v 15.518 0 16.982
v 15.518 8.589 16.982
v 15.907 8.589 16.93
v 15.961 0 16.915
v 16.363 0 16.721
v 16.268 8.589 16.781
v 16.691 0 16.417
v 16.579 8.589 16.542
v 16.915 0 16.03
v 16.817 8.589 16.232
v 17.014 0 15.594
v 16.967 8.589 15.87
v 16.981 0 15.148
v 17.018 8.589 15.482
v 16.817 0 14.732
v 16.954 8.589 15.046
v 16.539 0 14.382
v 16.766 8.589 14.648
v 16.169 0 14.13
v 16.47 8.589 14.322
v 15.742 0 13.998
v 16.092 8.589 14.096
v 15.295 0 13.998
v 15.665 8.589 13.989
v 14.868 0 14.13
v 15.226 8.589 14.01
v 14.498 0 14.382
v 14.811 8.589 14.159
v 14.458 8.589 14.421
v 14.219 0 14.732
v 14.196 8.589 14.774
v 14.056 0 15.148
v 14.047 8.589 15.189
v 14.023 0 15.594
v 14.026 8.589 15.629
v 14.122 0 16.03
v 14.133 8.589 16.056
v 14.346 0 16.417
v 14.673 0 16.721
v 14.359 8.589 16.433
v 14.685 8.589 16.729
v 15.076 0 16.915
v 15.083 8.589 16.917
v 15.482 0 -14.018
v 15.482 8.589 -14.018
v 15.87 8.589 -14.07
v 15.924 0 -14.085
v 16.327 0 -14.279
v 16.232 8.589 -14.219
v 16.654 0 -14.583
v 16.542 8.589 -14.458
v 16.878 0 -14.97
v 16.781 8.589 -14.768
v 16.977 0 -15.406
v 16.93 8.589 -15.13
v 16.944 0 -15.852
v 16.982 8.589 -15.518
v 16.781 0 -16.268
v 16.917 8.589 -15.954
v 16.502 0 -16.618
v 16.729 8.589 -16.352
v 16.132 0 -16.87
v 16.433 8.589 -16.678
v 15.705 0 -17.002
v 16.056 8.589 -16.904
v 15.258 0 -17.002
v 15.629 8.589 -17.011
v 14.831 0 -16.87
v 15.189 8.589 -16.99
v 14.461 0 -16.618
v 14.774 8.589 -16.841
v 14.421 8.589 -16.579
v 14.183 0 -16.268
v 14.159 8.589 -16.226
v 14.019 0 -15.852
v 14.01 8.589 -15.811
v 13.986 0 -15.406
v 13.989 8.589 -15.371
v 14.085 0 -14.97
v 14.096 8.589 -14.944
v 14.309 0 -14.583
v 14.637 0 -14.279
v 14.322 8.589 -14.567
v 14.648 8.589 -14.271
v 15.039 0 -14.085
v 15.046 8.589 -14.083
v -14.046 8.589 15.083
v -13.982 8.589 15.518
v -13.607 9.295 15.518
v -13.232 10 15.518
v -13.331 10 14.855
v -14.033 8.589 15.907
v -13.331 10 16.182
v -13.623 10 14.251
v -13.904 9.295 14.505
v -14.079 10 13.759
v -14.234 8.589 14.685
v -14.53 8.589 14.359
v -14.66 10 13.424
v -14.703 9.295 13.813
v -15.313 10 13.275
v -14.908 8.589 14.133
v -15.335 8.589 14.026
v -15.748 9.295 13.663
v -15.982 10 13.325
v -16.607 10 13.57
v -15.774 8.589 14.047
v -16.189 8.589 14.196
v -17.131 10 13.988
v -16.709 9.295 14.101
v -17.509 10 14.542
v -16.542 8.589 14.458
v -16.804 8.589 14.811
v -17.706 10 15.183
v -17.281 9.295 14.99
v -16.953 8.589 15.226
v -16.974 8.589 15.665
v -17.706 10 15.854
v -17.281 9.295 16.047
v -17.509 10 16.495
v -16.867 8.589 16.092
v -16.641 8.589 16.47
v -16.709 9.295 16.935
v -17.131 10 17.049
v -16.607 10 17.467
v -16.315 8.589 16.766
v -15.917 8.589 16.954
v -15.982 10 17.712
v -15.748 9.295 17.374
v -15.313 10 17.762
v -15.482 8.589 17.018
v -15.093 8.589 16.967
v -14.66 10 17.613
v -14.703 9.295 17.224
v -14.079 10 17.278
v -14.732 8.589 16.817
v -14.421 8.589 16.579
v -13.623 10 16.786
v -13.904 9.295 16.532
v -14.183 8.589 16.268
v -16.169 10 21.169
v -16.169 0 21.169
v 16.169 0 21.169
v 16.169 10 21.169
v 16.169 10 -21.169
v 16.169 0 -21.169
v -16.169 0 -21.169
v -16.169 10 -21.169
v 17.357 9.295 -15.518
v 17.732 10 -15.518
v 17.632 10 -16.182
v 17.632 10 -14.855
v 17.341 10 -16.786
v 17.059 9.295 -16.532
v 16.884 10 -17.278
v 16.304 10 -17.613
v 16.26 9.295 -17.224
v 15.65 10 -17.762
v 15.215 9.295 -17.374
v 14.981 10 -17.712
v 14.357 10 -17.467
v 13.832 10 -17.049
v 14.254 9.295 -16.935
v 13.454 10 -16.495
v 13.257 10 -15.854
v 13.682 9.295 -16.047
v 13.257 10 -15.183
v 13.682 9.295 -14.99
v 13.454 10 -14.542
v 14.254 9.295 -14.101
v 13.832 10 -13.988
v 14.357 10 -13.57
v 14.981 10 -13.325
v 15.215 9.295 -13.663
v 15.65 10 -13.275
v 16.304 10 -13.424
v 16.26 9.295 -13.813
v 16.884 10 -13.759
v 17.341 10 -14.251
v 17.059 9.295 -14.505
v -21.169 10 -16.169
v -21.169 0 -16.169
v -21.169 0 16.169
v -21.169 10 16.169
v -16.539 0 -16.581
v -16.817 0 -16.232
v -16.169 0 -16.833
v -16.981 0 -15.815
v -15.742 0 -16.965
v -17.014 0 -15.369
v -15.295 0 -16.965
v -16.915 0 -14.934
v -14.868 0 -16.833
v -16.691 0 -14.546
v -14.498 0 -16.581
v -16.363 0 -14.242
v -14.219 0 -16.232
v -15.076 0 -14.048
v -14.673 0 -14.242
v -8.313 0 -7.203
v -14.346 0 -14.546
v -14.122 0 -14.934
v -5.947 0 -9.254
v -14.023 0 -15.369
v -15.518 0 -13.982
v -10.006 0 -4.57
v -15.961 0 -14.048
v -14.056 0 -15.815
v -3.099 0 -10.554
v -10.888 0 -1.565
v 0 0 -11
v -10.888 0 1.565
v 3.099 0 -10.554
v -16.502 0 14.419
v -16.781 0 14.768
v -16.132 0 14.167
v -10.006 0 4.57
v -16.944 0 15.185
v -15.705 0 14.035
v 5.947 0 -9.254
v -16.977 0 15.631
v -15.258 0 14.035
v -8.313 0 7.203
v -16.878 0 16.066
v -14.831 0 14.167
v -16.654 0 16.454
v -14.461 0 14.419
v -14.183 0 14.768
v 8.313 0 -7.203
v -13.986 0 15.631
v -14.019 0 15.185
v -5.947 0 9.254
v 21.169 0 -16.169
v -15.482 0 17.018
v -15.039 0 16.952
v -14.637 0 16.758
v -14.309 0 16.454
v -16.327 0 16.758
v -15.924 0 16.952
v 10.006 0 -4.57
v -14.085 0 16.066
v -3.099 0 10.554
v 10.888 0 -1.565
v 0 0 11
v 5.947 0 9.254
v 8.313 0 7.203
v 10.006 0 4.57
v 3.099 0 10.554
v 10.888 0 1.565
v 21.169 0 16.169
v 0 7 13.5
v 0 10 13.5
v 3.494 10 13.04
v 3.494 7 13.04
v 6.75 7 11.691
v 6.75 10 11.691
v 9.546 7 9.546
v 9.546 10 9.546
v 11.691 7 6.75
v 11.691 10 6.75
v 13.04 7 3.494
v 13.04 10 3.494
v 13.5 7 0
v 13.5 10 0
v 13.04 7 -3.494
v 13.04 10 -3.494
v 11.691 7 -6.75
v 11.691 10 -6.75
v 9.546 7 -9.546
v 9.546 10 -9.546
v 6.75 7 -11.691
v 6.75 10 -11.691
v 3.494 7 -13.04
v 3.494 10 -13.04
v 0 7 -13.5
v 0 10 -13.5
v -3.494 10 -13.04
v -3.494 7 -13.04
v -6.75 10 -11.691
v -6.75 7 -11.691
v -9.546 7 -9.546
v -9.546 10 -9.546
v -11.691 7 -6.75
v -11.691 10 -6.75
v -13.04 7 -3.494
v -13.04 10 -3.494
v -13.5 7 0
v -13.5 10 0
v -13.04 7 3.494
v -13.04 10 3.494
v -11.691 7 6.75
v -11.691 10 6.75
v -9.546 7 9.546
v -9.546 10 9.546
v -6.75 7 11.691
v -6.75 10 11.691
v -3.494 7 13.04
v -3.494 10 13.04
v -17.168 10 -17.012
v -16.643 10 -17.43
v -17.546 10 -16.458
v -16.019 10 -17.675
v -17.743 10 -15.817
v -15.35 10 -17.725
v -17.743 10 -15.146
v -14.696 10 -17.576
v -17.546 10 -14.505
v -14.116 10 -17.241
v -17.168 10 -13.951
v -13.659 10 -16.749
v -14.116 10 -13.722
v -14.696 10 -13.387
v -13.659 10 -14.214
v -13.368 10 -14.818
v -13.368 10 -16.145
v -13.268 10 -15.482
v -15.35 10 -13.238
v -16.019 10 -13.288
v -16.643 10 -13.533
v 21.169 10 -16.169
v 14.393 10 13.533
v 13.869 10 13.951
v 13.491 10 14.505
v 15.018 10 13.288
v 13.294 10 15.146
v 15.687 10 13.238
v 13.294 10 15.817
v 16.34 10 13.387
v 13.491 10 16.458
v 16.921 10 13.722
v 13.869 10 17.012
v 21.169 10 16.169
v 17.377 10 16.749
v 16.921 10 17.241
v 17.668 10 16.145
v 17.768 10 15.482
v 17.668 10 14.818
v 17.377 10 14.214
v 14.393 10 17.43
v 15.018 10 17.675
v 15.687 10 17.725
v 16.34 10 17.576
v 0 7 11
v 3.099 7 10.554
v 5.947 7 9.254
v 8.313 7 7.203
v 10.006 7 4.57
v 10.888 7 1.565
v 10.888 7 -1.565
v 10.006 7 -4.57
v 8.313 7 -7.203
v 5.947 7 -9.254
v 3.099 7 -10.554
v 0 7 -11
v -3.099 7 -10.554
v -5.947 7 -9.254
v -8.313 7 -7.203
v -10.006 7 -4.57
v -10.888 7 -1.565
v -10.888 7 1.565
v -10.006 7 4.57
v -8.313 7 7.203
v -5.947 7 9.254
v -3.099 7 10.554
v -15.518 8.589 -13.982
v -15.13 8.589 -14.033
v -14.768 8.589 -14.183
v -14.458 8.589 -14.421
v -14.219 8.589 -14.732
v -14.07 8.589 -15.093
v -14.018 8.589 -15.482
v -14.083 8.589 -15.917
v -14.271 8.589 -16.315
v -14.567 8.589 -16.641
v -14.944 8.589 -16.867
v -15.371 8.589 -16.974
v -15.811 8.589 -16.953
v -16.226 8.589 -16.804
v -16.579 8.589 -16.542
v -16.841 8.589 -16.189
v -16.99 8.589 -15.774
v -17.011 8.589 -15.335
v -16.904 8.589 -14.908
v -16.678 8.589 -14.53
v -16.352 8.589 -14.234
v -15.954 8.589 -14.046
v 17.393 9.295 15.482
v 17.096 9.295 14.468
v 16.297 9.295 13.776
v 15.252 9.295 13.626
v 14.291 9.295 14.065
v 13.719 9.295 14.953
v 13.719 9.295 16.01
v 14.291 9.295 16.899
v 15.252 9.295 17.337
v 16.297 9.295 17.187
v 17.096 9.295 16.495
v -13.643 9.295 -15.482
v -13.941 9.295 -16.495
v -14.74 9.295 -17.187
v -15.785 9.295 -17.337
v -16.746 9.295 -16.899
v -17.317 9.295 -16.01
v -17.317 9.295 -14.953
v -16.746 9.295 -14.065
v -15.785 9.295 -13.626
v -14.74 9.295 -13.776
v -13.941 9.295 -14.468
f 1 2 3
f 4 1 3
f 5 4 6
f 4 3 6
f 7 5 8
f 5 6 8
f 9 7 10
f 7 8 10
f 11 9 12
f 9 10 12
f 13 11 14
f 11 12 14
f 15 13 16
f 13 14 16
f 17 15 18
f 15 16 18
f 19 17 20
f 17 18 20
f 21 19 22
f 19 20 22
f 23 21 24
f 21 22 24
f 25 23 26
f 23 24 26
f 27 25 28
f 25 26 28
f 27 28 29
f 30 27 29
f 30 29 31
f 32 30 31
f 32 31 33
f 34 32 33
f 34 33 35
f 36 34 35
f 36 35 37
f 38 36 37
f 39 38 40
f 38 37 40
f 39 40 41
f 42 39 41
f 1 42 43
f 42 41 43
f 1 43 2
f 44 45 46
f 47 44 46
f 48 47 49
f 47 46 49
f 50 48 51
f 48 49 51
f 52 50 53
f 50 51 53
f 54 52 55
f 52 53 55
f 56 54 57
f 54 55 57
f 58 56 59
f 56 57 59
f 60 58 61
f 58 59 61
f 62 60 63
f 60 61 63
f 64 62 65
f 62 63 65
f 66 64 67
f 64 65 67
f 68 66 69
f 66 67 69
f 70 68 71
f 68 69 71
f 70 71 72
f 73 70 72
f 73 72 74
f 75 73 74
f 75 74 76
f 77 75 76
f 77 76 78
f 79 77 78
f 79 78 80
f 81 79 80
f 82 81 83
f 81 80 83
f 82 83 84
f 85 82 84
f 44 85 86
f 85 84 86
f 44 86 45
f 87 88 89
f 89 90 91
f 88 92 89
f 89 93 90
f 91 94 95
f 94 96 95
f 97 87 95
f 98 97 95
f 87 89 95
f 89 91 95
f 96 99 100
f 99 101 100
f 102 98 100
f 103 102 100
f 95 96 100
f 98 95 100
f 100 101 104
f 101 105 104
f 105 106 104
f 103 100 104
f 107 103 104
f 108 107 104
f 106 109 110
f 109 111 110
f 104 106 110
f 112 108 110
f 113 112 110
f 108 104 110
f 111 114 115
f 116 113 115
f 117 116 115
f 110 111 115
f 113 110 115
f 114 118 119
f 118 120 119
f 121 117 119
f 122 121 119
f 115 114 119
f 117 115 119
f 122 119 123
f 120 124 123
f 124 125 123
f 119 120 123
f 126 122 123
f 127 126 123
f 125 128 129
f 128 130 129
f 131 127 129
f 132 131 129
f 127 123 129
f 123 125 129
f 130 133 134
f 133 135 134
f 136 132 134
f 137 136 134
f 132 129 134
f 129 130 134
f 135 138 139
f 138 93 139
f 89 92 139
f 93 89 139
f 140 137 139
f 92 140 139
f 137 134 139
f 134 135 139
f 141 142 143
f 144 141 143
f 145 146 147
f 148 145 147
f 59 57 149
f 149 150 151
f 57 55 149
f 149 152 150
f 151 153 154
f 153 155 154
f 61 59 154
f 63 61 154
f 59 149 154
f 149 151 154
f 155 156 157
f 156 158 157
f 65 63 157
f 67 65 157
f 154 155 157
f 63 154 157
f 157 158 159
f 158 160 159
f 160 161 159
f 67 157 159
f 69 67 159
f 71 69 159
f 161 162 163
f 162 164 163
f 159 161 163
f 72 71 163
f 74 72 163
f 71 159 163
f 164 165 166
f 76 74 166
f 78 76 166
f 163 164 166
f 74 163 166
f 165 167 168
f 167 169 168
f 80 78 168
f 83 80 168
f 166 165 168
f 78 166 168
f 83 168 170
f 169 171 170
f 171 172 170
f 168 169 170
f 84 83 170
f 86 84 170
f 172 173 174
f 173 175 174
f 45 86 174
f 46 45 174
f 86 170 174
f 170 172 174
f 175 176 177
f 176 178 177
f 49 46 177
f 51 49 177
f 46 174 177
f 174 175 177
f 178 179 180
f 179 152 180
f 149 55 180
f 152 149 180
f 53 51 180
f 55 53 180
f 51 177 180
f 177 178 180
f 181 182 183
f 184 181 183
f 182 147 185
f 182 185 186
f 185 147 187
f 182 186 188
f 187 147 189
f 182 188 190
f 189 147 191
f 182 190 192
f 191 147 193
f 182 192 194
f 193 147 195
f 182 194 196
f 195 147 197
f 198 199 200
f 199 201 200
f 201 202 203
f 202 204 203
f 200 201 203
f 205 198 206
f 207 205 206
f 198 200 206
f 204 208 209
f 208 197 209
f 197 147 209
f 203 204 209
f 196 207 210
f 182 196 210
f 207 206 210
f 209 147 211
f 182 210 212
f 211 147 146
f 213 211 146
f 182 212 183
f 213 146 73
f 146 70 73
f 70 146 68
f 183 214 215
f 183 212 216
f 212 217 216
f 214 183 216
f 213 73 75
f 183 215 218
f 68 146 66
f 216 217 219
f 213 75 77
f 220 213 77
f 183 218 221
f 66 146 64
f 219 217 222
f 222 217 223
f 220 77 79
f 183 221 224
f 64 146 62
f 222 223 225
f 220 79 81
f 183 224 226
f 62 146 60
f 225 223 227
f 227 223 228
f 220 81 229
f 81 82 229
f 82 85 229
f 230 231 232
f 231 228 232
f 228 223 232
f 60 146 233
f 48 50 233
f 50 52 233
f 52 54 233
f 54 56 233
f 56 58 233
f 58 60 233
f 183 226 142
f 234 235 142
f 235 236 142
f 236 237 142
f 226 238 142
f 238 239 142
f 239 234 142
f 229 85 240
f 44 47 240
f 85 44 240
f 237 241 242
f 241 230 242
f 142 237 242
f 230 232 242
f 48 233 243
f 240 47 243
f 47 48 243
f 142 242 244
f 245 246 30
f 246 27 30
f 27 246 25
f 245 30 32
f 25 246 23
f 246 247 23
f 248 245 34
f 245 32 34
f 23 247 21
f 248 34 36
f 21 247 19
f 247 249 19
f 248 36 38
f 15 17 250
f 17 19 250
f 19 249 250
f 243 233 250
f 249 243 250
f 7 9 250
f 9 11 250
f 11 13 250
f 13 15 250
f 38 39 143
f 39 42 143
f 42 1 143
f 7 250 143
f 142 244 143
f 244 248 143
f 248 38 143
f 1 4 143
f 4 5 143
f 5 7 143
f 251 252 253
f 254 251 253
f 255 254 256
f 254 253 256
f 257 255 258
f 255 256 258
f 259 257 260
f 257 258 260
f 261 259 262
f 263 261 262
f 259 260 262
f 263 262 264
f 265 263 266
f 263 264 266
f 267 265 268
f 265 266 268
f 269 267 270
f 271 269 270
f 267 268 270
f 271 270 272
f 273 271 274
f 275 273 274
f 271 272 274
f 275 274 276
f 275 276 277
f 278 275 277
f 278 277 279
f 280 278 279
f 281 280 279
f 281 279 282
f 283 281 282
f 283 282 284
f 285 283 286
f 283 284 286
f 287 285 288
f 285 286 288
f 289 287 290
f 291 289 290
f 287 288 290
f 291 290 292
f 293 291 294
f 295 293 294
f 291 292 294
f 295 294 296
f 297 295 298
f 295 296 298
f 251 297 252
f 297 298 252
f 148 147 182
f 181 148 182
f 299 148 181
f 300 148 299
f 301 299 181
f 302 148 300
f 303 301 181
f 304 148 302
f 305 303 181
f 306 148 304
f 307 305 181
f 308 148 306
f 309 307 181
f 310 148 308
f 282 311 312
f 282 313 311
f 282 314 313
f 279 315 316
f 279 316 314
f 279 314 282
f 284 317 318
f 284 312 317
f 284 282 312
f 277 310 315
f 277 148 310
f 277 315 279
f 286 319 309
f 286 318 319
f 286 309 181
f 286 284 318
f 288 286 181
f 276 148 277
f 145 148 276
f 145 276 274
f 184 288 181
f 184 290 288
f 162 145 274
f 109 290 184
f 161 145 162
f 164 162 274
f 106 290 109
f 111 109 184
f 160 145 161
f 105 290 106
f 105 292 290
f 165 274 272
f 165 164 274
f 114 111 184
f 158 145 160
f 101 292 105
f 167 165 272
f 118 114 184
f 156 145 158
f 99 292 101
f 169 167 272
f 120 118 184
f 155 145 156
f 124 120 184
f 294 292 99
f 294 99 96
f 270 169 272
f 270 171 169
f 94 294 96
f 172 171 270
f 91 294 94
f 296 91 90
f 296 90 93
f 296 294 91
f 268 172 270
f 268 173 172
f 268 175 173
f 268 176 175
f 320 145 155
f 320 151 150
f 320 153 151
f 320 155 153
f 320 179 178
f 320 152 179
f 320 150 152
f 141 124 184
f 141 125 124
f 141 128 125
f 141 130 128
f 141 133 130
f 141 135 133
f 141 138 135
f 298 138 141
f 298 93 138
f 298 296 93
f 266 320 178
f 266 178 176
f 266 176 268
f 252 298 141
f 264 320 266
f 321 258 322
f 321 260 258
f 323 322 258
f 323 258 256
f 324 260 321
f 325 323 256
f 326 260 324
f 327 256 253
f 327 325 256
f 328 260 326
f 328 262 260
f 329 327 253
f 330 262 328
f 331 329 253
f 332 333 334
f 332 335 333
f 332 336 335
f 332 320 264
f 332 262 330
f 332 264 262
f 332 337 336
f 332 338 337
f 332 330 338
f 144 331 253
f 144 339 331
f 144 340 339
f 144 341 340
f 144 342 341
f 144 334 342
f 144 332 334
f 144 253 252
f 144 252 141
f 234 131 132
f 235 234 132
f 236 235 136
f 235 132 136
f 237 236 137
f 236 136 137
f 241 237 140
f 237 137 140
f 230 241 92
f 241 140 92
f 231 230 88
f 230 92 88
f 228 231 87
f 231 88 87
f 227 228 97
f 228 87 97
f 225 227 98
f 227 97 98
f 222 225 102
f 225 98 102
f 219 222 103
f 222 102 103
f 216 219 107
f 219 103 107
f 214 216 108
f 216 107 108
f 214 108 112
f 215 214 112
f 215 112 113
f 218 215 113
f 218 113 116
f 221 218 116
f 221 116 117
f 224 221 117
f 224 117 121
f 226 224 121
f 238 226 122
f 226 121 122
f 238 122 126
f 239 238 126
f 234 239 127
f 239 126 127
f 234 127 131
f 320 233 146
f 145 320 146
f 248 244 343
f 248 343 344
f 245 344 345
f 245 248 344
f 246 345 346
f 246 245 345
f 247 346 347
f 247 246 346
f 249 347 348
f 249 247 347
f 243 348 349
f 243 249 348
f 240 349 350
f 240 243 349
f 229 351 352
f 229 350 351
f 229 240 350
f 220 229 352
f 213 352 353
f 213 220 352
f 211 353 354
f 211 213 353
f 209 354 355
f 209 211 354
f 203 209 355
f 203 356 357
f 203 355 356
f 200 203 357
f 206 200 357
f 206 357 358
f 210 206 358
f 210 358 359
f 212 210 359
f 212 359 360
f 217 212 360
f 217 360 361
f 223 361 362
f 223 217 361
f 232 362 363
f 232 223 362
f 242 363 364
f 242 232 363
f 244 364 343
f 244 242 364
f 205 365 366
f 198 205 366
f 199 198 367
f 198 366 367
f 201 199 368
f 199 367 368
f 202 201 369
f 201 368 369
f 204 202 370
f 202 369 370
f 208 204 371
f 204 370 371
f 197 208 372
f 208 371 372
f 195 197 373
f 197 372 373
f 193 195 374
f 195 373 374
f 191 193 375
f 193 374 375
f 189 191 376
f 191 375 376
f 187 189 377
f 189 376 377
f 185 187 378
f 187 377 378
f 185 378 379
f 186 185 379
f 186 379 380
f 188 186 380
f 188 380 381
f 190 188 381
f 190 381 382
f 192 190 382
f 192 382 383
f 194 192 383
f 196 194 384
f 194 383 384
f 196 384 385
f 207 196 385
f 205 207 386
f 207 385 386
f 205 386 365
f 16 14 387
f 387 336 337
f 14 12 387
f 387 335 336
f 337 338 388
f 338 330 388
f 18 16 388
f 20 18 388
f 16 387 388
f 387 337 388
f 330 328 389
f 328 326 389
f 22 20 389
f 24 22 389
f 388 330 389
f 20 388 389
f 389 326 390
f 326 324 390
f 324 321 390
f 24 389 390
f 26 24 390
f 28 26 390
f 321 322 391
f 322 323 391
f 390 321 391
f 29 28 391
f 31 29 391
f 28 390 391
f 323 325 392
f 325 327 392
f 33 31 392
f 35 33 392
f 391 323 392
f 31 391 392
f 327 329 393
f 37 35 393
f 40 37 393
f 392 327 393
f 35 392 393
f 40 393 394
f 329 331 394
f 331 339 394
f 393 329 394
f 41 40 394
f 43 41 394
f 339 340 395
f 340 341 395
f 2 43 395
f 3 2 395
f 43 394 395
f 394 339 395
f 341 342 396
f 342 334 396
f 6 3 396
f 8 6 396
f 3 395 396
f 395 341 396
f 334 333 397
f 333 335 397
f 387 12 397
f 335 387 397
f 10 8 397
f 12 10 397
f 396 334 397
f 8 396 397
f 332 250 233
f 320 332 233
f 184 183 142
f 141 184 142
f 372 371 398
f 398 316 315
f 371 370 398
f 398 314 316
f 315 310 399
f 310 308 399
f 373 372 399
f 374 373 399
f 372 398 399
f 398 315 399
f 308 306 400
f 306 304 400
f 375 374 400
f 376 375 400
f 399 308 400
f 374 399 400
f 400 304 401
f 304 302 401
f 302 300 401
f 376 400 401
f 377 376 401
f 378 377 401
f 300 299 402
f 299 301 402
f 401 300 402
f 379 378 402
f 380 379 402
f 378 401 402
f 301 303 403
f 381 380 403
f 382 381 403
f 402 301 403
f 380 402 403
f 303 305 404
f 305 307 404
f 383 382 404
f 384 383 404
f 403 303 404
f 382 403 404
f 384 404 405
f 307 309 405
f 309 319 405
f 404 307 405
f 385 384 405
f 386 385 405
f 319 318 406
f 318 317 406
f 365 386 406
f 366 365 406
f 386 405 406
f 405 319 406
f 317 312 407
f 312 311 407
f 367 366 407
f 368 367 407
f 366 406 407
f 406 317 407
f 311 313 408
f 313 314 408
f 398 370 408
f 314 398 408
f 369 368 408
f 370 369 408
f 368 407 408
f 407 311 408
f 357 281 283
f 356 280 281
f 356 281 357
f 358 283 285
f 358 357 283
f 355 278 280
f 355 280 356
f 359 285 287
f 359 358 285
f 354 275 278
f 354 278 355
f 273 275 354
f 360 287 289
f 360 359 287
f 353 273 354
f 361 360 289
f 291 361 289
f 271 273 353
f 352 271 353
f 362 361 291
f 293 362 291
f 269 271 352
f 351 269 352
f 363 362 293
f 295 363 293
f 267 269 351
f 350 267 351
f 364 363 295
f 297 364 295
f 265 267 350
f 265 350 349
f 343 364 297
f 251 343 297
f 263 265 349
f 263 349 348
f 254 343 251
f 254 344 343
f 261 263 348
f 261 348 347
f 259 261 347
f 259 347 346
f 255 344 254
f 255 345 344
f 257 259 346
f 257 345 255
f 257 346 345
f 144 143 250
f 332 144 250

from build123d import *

# Parameters (mm, degrees)
SKETCH1_R                    = 33.334829616
SKETCH1_R_2                  = 11
EXTRUDE1_DEPTH               = 10
SKETCH2_W                    = 68.7469374
SKETCH2_H                    = 68.7469374
CUT_EXTRUDE1_DEPTH           = 10
SKETCH3_R                    = 1.5
CUT_EXTRUDE2_DEPTH           = 32.563829392
SKETCH4_R                    = 2.25
CUT_EXTRUDE3_DEPTH           = 1.5
CUT_EXTRUDE3_DRAFT           = -28
CUT_EXTRUDE3_PROFILE_2_DEPTH = 1.5
CUT_EXTRUDE3_PROFILE_2_DRAFT = -28
CUT_EXTRUDE3_PROFILE_3_DEPTH = 1.5
CUT_EXTRUDE3_PROFILE_3_DRAFT = -28
CUT_EXTRUDE3_PROFILE_4_DEPTH = 1.5
CUT_EXTRUDE3_PROFILE_4_DRAFT = -28
SKETCH5_R                    = 13.5
CUT_EXTRUDE4_DEPTH           = 3


with BuildPart() as part:
    # Sketch1 → Extrude1 (new body)
    with BuildSketch(Plane(origin=(0, 0, 0), x_dir=(1, 0, 0), z_dir=(0, 1, 0))):
        with Locations(Location((0, 0, 0), (0, 0, 270))):
            Circle(SKETCH1_R)
        with Locations(Location((0, 0, 0), (0, 0, 270))):
            Circle(SKETCH1_R_2, mode=Mode.SUBTRACT)
    extrude(amount=EXTRUDE1_DEPTH)

    # Sketch2 → Cut-Extrude1 (cut)
    with BuildSketch(Plane.XZ):
        Rectangle(SKETCH2_W, SKETCH2_H)
        Polygon((16.16926222, 21.16926222), (21.16926222, 16.16926222), (21.16926222, -16.16926222), (16.16926222, -21.16926222), (-16.16926222, -21.16926222), (-21.16926222, -16.16926222), (-21.16926222, 16.16926222), (-16.16926222, 21.16926222), align=None, mode=Mode.SUBTRACT)
    extrude(amount=-CUT_EXTRUDE1_DEPTH, mode=Mode.SUBTRACT)

    # Sketch3 → Cut-Extrude2 (cut, through all)
    with BuildSketch(Plane(origin=(0, 10, 0), x_dir=(1, 0, 0), z_dir=(0, 1, 0))):
        with Locations(Location((-15.518439578, 15.481538459, 0), (0, 0, 270))):
            Circle(SKETCH3_R)
        with Locations(Location((-15.481538459, -15.518439578, 0), (0, 0, 270))):
            Circle(SKETCH3_R)
        with Locations(Location((15.481538459, 15.518439578, 0), (0, 0, 270))):
            Circle(SKETCH3_R)
        with Locations(Location((15.518439578, -15.481538459, 0), (0, 0, 270))):
            Circle(SKETCH3_R)
    extrude(amount=-CUT_EXTRUDE2_DEPTH, mode=Mode.SUBTRACT)


with BuildPart() as cut_extrude3_tool:
    # Sketch4 → Cut-Extrude3 (with draft: the straight prism first)
    with BuildSketch(Plane(origin=(0, 10, 0), x_dir=(1, 0, 0), z_dir=(0, 1, 0))):
        with Locations((-15.518439578, 15.481538459)):
            Circle(SKETCH4_R)
    extrude(amount=-CUT_EXTRUDE3_DEPTH)
    # Cut-Extrude3: the draft: its side faces are tilted about the plane it starts from
    cut_extrude3_sides = [cut_extrude3_tool.faces().sort_by_distance(p)[0] for p in [
        (-17.768439578, 9.25, -15.481538459),
    ]]
    draft(cut_extrude3_sides, Plane(origin=(0, 10, 0), x_dir=(1, 0, 0), z_dir=(0, 1, 0)), CUT_EXTRUDE3_DRAFT)


with BuildPart() as part_1:
    add(part.part)

    # Cut-Extrude3: cut by cut_extrude3_tool
    add(cut_extrude3_tool.part, mode=Mode.SUBTRACT)


with BuildPart() as cut_extrude3_profile_2_tool:
    # Sketch4 → Cut-Extrude3 profile 2 (with draft: the straight prism first)
    with BuildSketch(Plane(origin=(0, 10, 0), x_dir=(1, 0, 0), z_dir=(0, 1, 0))):
        with Locations((-15.481538459, -15.518439578)):
            Circle(SKETCH4_R)
    extrude(amount=-CUT_EXTRUDE3_PROFILE_2_DEPTH)
    # Cut-Extrude3 profile 2: the draft: its side faces are tilted about the plane it starts from
    cut_extrude3_profile_2_sides = [cut_extrude3_profile_2_tool.faces().sort_by_distance(p)[0] for p in [
        (-17.731538459, 9.25, 15.518439578),
    ]]
    draft(cut_extrude3_profile_2_sides, Plane(origin=(0, 10, 0), x_dir=(1, 0, 0), z_dir=(0, 1, 0)), CUT_EXTRUDE3_PROFILE_2_DRAFT)


with BuildPart() as part_2:
    add(part_1.part)

    # Cut-Extrude3 profile 2: cut by cut_extrude3_profile_2_tool
    add(cut_extrude3_profile_2_tool.part, mode=Mode.SUBTRACT)


with BuildPart() as cut_extrude3_profile_3_tool:
    # Sketch4 → Cut-Extrude3 profile 3 (with draft: the straight prism first)
    with BuildSketch(Plane(origin=(0, 10, 0), x_dir=(1, 0, 0), z_dir=(0, 1, 0))):
        with Locations((15.481538459, 15.518439578)):
            Circle(SKETCH4_R)
    extrude(amount=-CUT_EXTRUDE3_PROFILE_3_DEPTH)
    # Cut-Extrude3 profile 3: the draft: its side faces are tilted about the plane it starts from
    cut_extrude3_profile_3_sides = [cut_extrude3_profile_3_tool.faces().sort_by_distance(p)[0] for p in [
        (13.231538459, 9.25, -15.518439578),
    ]]
    draft(cut_extrude3_profile_3_sides, Plane(origin=(0, 10, 0), x_dir=(1, 0, 0), z_dir=(0, 1, 0)), CUT_EXTRUDE3_PROFILE_3_DRAFT)


with BuildPart() as part_3:
    add(part_2.part)

    # Cut-Extrude3 profile 3: cut by cut_extrude3_profile_3_tool
    add(cut_extrude3_profile_3_tool.part, mode=Mode.SUBTRACT)


with BuildPart() as cut_extrude3_profile_4_tool:
    # Sketch4 → Cut-Extrude3 profile 4 (with draft: the straight prism first)
    with BuildSketch(Plane(origin=(0, 10, 0), x_dir=(1, 0, 0), z_dir=(0, 1, 0))):
        with Locations((15.518439578, -15.481538459)):
            Circle(SKETCH4_R)
    extrude(amount=-CUT_EXTRUDE3_PROFILE_4_DEPTH)
    # Cut-Extrude3 profile 4: the draft: its side faces are tilted about the plane it starts from
    cut_extrude3_profile_4_sides = [cut_extrude3_profile_4_tool.faces().sort_by_distance(p)[0] for p in [
        (13.268439578, 9.25, 15.481538459),
    ]]
    draft(cut_extrude3_profile_4_sides, Plane(origin=(0, 10, 0), x_dir=(1, 0, 0), z_dir=(0, 1, 0)), CUT_EXTRUDE3_PROFILE_4_DRAFT)


with BuildPart() as part_4:
    add(part_3.part)

    # Cut-Extrude3 profile 4: cut by cut_extrude3_profile_4_tool
    add(cut_extrude3_profile_4_tool.part, mode=Mode.SUBTRACT)

    # Sketch5 → Cut-Extrude4 (cut)
    with BuildSketch(Plane(origin=(0, 10, 0), x_dir=(1, 0, 0), z_dir=(0, 1, 0))):
        with Locations(Location((0, 0, 0), (0, 0, 270))):
            Circle(SKETCH5_R)
    extrude(amount=-CUT_EXTRUDE4_DEPTH, mode=Mode.SUBTRACT)


solid = part_4.part
